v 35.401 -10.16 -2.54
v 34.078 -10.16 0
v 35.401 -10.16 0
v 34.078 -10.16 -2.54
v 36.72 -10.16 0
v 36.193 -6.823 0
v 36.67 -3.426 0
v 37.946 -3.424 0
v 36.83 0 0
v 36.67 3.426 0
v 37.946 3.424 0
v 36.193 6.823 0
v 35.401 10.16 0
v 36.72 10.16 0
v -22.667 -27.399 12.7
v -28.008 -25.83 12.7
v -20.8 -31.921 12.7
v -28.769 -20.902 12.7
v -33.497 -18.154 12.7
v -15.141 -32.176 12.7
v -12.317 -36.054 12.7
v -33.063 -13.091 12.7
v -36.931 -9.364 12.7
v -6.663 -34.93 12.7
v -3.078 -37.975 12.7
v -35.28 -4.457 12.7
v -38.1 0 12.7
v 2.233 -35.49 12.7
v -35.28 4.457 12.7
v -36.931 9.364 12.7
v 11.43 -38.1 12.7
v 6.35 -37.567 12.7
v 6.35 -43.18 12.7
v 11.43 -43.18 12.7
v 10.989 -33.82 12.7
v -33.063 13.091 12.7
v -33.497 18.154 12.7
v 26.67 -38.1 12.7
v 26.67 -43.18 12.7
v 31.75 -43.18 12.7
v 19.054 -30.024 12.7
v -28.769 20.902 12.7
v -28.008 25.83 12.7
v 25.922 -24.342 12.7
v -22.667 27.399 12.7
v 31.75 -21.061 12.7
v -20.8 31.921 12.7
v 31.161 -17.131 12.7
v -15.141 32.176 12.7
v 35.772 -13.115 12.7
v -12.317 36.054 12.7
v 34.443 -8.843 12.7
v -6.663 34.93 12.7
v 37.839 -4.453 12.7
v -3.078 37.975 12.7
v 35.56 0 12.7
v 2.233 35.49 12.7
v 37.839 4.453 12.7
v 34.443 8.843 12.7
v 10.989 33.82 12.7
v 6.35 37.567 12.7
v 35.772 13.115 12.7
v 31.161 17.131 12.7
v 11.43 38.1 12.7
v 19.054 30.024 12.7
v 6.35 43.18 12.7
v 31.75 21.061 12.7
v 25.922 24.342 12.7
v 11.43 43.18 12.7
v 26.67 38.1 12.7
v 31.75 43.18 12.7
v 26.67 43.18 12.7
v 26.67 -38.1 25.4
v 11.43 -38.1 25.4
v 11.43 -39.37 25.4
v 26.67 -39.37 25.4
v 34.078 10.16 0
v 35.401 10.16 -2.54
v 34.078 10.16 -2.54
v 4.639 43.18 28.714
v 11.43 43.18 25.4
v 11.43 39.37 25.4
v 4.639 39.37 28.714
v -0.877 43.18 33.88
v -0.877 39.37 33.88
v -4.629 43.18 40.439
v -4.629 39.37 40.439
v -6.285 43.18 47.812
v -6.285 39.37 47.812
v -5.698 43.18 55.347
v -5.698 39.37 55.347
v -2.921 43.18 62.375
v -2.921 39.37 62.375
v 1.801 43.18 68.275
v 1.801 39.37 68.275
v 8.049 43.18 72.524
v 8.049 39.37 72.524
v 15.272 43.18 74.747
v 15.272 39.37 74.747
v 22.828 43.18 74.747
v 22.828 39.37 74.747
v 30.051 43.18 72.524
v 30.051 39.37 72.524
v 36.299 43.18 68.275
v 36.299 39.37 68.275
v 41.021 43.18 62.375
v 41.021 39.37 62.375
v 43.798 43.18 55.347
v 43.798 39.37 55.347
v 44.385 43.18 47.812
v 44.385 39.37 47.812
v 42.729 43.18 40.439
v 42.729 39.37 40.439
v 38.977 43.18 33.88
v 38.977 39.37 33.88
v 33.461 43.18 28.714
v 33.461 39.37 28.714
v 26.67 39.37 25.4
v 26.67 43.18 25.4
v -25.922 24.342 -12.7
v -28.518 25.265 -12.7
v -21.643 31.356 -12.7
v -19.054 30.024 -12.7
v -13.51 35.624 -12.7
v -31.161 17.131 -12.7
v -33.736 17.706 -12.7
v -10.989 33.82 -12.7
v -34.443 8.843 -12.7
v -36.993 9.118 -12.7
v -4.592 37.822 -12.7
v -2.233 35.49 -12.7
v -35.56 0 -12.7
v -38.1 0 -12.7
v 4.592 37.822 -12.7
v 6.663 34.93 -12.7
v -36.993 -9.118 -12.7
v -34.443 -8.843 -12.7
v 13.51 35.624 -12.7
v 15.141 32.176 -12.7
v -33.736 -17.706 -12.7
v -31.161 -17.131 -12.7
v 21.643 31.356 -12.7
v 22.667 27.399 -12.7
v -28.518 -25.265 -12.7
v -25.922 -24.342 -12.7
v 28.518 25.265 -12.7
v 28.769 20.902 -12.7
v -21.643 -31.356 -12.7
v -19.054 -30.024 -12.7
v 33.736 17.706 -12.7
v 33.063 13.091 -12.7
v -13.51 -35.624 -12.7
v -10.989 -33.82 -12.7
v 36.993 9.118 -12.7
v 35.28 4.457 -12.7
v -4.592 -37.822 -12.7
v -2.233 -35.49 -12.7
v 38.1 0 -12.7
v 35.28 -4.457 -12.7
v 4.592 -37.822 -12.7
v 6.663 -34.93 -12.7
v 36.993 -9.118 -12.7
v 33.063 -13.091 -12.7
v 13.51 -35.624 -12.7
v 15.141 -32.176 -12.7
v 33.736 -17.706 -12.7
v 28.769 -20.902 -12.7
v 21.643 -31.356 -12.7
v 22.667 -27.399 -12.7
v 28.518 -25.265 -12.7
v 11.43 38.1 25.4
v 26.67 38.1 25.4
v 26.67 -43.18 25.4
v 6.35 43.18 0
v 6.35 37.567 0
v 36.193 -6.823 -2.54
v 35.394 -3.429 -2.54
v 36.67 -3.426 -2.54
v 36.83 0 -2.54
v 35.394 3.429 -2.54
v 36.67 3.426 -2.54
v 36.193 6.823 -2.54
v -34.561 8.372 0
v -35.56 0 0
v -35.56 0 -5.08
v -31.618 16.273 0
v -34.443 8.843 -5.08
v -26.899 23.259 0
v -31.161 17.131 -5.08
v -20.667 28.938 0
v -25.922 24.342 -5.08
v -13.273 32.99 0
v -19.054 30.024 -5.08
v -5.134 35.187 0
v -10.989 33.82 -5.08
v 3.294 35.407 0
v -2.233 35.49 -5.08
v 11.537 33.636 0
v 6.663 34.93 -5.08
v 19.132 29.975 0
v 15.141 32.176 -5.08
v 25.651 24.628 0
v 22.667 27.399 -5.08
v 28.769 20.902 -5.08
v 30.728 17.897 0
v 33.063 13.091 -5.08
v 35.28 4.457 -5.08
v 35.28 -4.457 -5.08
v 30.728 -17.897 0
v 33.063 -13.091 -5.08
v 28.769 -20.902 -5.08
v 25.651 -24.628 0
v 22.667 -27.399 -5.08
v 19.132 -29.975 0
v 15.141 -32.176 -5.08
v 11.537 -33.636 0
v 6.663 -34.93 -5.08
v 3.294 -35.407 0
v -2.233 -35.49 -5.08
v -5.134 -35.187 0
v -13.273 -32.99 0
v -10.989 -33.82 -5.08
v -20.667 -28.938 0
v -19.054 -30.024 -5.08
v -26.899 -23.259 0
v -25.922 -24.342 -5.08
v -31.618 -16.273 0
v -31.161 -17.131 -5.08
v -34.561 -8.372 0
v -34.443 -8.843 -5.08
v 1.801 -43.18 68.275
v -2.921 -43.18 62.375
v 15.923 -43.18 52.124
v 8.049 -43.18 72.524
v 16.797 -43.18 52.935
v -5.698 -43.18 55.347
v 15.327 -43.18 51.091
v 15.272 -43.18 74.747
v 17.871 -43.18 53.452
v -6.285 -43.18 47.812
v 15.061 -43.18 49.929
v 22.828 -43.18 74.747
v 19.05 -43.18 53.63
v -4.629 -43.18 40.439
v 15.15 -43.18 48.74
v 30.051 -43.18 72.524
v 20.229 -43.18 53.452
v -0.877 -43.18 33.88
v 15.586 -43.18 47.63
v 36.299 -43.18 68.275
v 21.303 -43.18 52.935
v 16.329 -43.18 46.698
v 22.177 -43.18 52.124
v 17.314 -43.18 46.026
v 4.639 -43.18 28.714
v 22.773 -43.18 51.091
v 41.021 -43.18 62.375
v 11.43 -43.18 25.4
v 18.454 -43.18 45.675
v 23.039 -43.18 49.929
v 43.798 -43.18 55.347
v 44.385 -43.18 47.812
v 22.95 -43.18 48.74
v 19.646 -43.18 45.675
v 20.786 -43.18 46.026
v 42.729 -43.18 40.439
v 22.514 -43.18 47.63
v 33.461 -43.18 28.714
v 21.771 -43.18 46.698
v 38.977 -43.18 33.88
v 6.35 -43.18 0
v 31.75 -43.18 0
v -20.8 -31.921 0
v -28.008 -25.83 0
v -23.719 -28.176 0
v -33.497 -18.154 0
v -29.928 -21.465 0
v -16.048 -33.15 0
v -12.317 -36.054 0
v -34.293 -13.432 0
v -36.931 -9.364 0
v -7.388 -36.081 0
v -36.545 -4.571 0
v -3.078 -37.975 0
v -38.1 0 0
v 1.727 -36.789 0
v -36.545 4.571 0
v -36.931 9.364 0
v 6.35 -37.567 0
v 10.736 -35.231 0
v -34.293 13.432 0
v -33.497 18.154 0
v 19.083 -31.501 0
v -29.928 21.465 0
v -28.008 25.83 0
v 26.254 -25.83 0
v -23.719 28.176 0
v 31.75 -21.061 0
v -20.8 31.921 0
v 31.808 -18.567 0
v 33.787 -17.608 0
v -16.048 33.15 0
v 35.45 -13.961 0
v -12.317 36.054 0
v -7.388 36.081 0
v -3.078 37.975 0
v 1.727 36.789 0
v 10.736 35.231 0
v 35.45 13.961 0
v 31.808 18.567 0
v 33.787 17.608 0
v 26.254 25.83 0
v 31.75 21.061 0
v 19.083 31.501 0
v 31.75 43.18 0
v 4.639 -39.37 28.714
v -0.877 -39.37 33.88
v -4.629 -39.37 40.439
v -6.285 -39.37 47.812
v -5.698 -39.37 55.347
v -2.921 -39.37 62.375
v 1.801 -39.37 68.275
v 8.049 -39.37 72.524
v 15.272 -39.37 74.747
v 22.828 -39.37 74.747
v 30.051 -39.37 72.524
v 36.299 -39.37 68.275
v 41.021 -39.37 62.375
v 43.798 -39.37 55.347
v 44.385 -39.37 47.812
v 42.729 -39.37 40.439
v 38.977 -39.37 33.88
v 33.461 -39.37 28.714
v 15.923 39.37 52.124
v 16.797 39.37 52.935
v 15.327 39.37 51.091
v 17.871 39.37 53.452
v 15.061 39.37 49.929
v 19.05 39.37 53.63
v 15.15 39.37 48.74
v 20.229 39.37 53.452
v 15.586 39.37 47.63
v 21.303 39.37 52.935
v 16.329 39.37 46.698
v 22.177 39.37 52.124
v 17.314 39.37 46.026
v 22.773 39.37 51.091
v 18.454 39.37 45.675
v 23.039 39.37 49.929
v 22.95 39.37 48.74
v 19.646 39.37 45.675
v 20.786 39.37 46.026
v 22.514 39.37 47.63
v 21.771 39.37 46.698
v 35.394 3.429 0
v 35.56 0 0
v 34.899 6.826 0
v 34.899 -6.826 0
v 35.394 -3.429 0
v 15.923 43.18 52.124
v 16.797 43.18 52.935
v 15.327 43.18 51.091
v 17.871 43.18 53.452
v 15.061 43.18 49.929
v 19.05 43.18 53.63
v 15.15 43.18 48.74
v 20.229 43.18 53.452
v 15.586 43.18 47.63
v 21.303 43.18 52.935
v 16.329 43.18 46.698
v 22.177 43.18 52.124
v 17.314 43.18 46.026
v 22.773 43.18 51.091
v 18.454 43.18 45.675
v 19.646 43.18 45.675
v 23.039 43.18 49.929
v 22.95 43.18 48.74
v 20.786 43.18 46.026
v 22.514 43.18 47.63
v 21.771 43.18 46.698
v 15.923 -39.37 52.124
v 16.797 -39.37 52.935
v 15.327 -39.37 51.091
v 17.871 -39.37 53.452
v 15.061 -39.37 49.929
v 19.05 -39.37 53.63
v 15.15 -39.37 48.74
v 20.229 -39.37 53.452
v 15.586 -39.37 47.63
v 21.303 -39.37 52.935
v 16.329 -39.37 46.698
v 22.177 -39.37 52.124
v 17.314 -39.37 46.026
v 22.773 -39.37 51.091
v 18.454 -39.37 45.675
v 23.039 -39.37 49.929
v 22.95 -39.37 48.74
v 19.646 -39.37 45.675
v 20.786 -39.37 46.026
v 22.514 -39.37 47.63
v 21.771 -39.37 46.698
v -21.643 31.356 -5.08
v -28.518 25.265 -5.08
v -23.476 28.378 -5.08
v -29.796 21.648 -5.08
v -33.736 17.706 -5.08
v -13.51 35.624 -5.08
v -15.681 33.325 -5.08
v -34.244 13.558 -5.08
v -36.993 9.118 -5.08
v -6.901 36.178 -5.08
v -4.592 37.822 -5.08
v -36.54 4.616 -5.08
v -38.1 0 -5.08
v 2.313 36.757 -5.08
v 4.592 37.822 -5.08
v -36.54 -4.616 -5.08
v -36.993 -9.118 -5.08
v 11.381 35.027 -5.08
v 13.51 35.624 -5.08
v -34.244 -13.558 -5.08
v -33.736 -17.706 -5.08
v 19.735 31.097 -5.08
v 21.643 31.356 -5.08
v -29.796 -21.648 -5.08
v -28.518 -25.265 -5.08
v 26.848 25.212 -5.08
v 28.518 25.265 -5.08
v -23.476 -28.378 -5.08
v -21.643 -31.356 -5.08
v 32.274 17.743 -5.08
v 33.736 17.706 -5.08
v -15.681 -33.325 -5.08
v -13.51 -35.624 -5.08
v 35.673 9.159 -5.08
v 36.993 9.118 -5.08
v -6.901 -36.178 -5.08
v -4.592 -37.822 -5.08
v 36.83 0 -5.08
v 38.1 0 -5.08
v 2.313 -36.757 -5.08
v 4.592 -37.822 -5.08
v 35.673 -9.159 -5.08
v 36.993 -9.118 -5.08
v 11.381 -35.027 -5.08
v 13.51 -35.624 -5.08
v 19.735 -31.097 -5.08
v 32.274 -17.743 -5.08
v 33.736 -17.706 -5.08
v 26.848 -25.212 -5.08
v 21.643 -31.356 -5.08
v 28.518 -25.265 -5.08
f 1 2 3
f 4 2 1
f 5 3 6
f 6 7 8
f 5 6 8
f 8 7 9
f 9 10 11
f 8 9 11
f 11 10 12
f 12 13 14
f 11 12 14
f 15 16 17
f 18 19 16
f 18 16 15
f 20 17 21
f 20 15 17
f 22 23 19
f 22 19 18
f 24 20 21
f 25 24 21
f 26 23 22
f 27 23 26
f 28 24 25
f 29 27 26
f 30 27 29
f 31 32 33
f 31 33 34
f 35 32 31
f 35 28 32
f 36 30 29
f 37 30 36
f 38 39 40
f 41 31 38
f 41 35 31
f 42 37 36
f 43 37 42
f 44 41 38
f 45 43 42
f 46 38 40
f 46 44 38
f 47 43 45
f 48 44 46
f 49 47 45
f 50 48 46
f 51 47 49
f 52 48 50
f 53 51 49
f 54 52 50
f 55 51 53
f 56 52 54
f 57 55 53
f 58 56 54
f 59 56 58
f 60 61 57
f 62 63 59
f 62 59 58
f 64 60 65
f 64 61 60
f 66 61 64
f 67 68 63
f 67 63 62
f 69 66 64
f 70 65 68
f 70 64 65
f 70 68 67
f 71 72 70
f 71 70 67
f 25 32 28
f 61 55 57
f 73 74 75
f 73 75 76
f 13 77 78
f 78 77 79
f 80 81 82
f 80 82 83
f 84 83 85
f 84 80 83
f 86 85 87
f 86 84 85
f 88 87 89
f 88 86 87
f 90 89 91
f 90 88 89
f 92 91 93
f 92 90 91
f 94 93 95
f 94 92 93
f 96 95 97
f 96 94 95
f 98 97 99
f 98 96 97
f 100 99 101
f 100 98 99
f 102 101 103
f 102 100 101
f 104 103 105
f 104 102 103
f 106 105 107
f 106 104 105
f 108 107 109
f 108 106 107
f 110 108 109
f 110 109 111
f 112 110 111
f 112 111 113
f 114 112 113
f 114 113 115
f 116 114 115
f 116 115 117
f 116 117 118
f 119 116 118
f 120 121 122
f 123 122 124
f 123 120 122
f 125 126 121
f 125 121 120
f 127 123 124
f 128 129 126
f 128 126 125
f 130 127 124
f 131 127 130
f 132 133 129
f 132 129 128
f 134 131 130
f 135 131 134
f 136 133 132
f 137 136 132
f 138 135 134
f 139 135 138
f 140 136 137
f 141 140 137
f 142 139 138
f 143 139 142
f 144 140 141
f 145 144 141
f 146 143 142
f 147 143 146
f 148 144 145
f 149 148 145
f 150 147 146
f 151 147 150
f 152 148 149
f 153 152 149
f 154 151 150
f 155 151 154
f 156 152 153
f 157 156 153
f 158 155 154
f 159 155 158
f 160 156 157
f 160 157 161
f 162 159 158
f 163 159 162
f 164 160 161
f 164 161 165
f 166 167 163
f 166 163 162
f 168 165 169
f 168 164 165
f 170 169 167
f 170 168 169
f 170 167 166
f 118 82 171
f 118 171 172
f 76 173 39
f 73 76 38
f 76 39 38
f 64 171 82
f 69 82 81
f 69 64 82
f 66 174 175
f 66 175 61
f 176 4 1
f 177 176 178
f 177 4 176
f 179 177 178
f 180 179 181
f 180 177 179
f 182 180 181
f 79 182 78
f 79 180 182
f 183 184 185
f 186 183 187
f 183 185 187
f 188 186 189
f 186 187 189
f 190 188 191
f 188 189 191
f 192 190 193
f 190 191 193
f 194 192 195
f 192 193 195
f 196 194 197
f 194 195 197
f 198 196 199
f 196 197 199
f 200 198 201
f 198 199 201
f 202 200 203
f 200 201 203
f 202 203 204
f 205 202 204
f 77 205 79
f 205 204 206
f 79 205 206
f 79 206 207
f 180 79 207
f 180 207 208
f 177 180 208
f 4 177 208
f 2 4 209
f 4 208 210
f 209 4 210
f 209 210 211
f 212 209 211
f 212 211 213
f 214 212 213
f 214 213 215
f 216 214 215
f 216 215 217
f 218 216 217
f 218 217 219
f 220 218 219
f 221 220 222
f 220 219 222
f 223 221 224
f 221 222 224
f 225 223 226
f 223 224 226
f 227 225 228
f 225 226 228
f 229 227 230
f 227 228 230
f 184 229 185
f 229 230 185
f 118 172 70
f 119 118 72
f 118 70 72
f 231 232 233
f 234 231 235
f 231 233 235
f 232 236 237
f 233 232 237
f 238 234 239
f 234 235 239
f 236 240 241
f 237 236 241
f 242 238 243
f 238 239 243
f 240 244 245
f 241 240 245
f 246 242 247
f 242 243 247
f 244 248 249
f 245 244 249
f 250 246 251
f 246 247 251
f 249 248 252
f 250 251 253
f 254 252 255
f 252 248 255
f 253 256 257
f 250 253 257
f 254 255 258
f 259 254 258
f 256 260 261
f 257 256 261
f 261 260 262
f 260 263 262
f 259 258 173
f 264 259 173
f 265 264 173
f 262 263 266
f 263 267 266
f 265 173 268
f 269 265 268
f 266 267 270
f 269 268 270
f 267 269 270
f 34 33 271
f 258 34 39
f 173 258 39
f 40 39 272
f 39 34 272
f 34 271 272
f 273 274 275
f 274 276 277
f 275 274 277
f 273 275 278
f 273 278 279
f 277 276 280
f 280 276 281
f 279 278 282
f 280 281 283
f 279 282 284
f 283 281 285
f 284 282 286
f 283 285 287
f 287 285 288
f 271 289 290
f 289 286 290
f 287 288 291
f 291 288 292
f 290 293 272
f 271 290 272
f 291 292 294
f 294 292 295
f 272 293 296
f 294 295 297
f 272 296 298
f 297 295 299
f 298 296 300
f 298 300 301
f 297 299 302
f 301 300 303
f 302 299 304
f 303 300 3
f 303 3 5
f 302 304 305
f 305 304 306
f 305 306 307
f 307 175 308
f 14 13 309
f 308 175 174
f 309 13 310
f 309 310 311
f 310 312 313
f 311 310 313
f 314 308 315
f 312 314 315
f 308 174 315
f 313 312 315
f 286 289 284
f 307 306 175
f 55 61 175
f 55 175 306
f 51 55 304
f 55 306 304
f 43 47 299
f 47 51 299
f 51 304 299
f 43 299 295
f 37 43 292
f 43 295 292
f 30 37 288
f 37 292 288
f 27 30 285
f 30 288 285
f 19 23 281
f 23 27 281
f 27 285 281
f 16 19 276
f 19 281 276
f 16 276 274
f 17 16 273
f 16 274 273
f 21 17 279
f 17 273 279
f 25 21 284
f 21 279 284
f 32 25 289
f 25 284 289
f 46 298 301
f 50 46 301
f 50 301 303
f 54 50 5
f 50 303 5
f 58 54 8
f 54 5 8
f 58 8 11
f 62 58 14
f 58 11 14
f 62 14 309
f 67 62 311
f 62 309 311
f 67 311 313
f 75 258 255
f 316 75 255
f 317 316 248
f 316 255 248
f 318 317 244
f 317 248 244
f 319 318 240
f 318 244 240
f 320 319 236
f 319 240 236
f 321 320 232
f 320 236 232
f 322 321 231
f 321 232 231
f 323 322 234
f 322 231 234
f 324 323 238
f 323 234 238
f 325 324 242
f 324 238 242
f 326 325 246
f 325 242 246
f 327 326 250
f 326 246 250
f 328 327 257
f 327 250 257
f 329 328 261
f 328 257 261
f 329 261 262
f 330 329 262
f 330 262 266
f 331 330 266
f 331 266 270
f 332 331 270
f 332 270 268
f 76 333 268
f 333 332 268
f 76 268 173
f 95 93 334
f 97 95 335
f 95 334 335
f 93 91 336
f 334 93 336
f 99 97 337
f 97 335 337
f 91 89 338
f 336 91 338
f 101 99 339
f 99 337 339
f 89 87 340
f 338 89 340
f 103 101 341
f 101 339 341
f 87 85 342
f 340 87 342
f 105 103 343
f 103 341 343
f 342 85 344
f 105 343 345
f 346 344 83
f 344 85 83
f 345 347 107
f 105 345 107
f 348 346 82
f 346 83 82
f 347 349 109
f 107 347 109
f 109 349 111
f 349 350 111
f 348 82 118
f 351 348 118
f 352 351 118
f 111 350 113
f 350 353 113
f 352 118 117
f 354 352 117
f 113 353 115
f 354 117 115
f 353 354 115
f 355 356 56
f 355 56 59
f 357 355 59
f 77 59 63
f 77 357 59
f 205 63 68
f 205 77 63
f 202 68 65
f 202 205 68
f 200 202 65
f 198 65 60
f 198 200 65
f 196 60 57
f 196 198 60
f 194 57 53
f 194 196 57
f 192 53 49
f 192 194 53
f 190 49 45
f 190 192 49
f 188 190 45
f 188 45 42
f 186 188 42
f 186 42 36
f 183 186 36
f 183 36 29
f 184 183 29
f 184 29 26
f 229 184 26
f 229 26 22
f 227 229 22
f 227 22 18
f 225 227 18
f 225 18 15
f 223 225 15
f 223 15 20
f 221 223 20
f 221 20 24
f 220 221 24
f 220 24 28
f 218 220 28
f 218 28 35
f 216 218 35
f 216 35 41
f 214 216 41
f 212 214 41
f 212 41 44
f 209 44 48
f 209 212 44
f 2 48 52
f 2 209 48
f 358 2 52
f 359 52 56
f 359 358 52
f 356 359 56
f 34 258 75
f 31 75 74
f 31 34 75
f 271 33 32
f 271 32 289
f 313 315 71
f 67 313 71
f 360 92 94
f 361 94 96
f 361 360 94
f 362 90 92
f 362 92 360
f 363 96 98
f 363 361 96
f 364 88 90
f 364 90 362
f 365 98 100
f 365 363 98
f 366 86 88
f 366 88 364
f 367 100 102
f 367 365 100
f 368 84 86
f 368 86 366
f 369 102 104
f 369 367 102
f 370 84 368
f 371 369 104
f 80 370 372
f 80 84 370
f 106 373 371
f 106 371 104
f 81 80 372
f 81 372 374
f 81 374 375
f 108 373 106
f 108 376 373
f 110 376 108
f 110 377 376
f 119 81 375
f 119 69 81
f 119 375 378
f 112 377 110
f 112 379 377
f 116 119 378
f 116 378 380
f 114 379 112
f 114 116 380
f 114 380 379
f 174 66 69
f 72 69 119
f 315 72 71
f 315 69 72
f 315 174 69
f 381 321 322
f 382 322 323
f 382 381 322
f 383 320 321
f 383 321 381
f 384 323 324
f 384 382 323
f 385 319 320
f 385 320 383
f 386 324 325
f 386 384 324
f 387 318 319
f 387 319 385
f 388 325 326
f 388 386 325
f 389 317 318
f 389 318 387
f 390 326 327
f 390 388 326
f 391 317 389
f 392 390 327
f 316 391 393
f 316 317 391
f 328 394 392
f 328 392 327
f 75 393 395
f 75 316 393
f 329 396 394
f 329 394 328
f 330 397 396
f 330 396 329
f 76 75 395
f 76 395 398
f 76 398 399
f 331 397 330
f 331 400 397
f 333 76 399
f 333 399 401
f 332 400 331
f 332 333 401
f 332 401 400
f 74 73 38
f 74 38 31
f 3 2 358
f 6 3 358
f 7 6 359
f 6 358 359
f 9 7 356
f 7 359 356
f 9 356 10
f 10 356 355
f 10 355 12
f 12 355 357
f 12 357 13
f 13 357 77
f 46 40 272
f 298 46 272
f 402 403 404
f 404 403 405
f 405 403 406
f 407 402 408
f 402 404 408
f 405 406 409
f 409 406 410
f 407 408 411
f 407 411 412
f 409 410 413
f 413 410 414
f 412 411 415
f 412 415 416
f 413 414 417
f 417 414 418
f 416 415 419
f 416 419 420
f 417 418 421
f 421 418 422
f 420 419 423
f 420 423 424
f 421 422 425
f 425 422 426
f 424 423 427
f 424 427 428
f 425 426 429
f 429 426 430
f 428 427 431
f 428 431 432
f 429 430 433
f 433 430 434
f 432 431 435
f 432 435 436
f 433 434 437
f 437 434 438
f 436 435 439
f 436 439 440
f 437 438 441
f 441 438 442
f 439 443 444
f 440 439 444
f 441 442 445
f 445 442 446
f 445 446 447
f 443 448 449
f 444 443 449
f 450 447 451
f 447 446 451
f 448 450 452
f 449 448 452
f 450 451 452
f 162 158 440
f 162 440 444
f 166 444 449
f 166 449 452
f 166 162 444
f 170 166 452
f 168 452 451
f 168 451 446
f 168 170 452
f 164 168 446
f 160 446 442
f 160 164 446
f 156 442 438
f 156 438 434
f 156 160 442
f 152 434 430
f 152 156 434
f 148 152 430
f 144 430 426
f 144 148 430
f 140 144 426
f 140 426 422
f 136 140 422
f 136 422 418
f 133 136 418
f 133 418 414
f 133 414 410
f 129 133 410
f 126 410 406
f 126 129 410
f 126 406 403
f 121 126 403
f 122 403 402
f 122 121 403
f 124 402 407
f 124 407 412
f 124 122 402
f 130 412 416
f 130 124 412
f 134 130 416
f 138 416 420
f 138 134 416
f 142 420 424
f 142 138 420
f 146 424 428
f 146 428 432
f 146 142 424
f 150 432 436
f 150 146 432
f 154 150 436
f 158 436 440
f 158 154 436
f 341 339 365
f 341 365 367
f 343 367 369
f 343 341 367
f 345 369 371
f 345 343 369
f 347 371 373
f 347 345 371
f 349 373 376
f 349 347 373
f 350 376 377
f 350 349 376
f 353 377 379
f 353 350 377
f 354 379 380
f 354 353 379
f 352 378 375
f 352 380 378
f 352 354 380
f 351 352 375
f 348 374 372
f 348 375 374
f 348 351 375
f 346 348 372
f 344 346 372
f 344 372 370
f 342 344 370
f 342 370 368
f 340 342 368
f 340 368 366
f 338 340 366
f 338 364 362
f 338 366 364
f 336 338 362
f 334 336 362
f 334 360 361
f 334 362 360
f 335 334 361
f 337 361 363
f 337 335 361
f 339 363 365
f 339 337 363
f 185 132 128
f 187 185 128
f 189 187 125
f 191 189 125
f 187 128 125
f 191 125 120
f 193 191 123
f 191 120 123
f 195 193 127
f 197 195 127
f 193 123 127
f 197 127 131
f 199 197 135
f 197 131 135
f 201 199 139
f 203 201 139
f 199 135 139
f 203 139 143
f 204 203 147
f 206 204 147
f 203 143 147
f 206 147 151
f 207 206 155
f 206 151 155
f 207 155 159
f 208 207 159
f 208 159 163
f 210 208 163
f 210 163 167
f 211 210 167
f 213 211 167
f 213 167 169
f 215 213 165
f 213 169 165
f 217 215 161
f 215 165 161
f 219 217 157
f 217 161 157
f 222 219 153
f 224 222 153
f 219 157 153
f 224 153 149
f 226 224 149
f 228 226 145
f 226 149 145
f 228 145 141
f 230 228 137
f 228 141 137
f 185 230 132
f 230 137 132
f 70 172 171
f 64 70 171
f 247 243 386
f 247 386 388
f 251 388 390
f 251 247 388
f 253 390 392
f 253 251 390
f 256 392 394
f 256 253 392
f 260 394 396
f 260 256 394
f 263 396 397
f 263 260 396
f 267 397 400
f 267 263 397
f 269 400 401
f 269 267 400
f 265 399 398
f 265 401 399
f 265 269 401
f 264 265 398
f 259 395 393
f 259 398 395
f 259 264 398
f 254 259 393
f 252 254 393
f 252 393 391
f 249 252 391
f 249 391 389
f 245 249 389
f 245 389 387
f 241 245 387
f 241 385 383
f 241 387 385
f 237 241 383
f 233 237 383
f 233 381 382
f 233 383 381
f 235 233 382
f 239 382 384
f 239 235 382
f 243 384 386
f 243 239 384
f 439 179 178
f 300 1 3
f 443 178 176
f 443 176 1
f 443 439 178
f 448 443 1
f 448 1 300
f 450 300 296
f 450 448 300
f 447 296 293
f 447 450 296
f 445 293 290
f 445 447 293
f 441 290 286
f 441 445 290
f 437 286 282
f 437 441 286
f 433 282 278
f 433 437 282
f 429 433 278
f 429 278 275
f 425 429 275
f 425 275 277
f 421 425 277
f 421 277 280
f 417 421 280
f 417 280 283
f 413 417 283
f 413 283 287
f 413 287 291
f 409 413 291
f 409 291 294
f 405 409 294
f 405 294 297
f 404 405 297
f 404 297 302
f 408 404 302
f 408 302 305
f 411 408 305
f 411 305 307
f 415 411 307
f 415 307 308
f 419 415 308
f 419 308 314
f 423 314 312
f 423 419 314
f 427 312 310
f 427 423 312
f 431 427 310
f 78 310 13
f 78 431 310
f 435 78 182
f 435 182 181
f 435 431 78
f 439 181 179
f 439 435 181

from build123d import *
from build123d.topology import SkipClean

# Parameters (mm, degrees)
SKETCH2_R                = 38.1
SKETCH2_R_2              = 35.56
BOSS_EXTRUDE1_DEPTH      = 12.7
SKETCH4_W                = 15.24
SKETCH4_H                = 5.08
BOSS_EXTRUDE2_DEPTH      = 12.7
BOSS_EXTRUDE2_2_DEPTH    = 12.7
SKETCH5_W                = 25.4
SKETCH5_H                = 5.08
BOSS_EXTRUDE4_DEPTH      = 12.7
BOSS_EXTRUDE4_2_DEPTH    = 12.7
BOSS_EXTRUDE5_REACH      = 95.291
BOSS_EXTRUDE5_END_RADIUS = 38.1
SKETCH6_W                = 25.4
SKETCH6_H                = 12.7
BOSS_EXTRUDE6_REACH      = 95.291
BOSS_EXTRUDE6_END_RADIUS = 38.1
SKETCH7_W                = 25.4
SKETCH7_H                = 12.7
SKETCH8_R                = 25.4
BOSS_EXTRUDE7_DEPTH      = 3.81
BOSS_EXTRUDE8_START      = 5.08
SKETCH9_R                = 36.83
SKETCH9_R_2              = 35.56
BOSS_EXTRUDE8_DEPTH      = 5.08
BOSS_EXTRUDE9_START      = 7.62
SKETCH10_R               = 38.1
SKETCH10_R_2             = 35.56
BOSS_EXTRUDE9_DEPTH      = 7.62
SKETCH13_W               = 2.54
SKETCH13_H               = 20.32
CUT_EXTRUDE2_DEPTH       = 98.313021537
CUT_EXTRUDE3_DEPTH       = 123.732886223
CUT_EXTRUDE3_DEPTH_BACK  = 123.732886223
SKETCH14_R               = 4


with BuildPart() as part:
    # Sketch2 → Boss-Extrude1 (new body)
    with BuildSketch(Plane.XY):
        Circle(SKETCH2_R)
        Circle(SKETCH2_R_2, mode=Mode.SUBTRACT)
    extrude(amount=BOSS_EXTRUDE1_DEPTH)



with BuildPart() as body_2:
    # Sketch4 → Boss-Extrude2 (new body)
    with BuildSketch(Plane.XY.offset(12.7)):
        with Locations((19.05, 40.64)):
            Rectangle(SKETCH4_W, SKETCH4_H)
    extrude(amount=BOSS_EXTRUDE2_DEPTH)


with BuildPart() as body_3:
    # Sketch4 → Boss-Extrude2 2 (new body)
    with BuildSketch(Plane.XY.offset(12.7)):
        with Locations((19.05, -40.64)):
            Rectangle(SKETCH4_W, SKETCH4_H)
    extrude(amount=BOSS_EXTRUDE2_2_DEPTH)


with BuildPart() as body_4:
    # Sketch5 → Boss-Extrude4 (new body)
    with BuildSketch(Plane(origin=(0, 0, 12.7), x_dir=(-1, 0, 0), z_dir=(0, 0, -1))):
        with Locations((-19.05, 40.64)):
            Rectangle(SKETCH5_W, SKETCH5_H)
    extrude(amount=BOSS_EXTRUDE4_DEPTH)


with BuildPart() as body_5:
    # Sketch5 → Boss-Extrude4 2 (new body)
    with BuildSketch(Plane(origin=(0, 0, 12.7), x_dir=(-1, 0, 0), z_dir=(0, 0, -1))):
        with Locations((-19.05, -40.64)):
            Rectangle(SKETCH5_W, SKETCH5_H)
    extrude(amount=BOSS_EXTRUDE4_2_DEPTH)


with BuildPart() as part_1:
    add(part.part)

    add(body_3.part)  # Boss-Extrude5 merges body 3

    add(body_5.part)  # Boss-Extrude5 merges body 5
    # Boss-Extrude5: up to this cylinder (the profile starts outside it)
    boss_extrude5_end = Plane(origin=(0, 0, 6.35), z_dir=(0, 0, -1)) * Cylinder(BOSS_EXTRUDE5_END_RADIUS, 267.782, mode=Mode.PRIVATE)
    # Sketch6 → Boss-Extrude5 (add, up to the surface)
    with BuildSketch(Plane(origin=(0, -38.1, 0), x_dir=(1, 0, 0), z_dir=(0, 1, 0)), mode=Mode.PRIVATE) as boss_extrude5_sk1:
        with Locations((19.05, -6.35)):
            Rectangle(SKETCH6_W, SKETCH6_H)
    boss_extrude5_tool1 = extrude(boss_extrude5_sk1.sketch, amount=BOSS_EXTRUDE5_REACH, mode=Mode.PRIVATE) - boss_extrude5_end
    add(boss_extrude5_tool1.solids().sort_by_distance((19.05, -38.1, 6.35))[0])


    add(body_2.part)  # Boss-Extrude6 merges body 2

    add(body_4.part)  # Boss-Extrude6 merges body 4
    # Boss-Extrude6: up to this cylinder (the profile starts outside it)
    boss_extrude6_end = Plane(origin=(0, 0, 6.35), z_dir=(0, 0, -1)) * Cylinder(BOSS_EXTRUDE6_END_RADIUS, 267.782, mode=Mode.PRIVATE)
    # Sketch7 → Boss-Extrude6 (add, up to the surface)
    with BuildSketch(Plane.XZ.offset(-38.1), mode=Mode.PRIVATE) as boss_extrude6_sk1:
        with Locations((19.05, 6.35)):
            Rectangle(SKETCH7_W, SKETCH7_H)
    boss_extrude6_tool1 = extrude(boss_extrude6_sk1.sketch, amount=BOSS_EXTRUDE6_REACH, mode=Mode.PRIVATE) - boss_extrude6_end
    add(boss_extrude6_tool1.solids().sort_by_distance((19.05, 38.1, 6.35))[0])

    # Sketch8 → Boss-Extrude7 (add)
    with BuildSketch(Plane(origin=(0, 43.18, 0), x_dir=(1, 0, 0), z_dir=(0, 1, 0))):
        with Locations((19.05, -49.630055716)):
            Circle(SKETCH8_R)
    boss_extrude7 = extrude(amount=-BOSS_EXTRUDE7_DEPTH)

    # Mirror1: Boss-Extrude7 across plane
    add(boss_extrude7.mirror(Plane.ZX))

    # Sketch9 → Boss-Extrude8 (add)
    with SkipClean():  # the faces are left unmerged after this step: merging them gives an invalid solid
        with BuildSketch(Plane(origin=(0, 0, 0), x_dir=(-1, 0, 0), z_dir=(0, 0, -1)).offset(BOSS_EXTRUDE8_START)):
            with Locations(Location((0, 0, 0), (0, 0, 180))):
                Circle(SKETCH9_R)
            Circle(SKETCH9_R_2, mode=Mode.SUBTRACT)
        extrude(amount=-BOSS_EXTRUDE8_DEPTH)

    # Sketch10 → Boss-Extrude9 (add)
    with SkipClean():  # the faces are left unmerged after this step: merging them gives an invalid solid
        with BuildSketch(Plane(origin=(0, 0, -5.08), x_dir=(-1, 0, 0), z_dir=(0, 0, -1)).offset(BOSS_EXTRUDE9_START)):
            with Locations(Location((0, 0, 0), (0, 0, 180))):
                Circle(SKETCH10_R)
            Circle(SKETCH10_R_2, mode=Mode.SUBTRACT)
        extrude(amount=-BOSS_EXTRUDE9_DEPTH)

    # Sketch13 → Cut-Extrude2 (cut, through all)
    with SkipClean():  # the faces are left unmerged after this step: merging them gives an invalid solid
        with BuildSketch(Plane(origin=(0, 0, 0), x_dir=(0, 0, -1), z_dir=(1, 0, 0))):
            with Locations((1.27, 0)):
                Rectangle(SKETCH13_W, SKETCH13_H)
        extrude(amount=CUT_EXTRUDE2_DEPTH, mode=Mode.SUBTRACT)

    # Sketch14 → Cut-Extrude3 (cut, two sides: drawn at the far end of the back side and taken through both)
    with SkipClean():  # the faces are left unmerged after this step: merging them gives an invalid solid
        with BuildSketch(Plane(origin=(0, 43.18, 0), x_dir=(1, 0, 0), z_dir=(0, 1, 0)).offset(-CUT_EXTRUDE3_DEPTH_BACK)):
            with Locations(Location((19.05, -49.630055716, 0), (0, 0, 270))):
                Circle(SKETCH14_R)
        extrude(amount=CUT_EXTRUDE3_DEPTH + CUT_EXTRUDE3_DEPTH_BACK, mode=Mode.SUBTRACT)


solid = part_1.part
